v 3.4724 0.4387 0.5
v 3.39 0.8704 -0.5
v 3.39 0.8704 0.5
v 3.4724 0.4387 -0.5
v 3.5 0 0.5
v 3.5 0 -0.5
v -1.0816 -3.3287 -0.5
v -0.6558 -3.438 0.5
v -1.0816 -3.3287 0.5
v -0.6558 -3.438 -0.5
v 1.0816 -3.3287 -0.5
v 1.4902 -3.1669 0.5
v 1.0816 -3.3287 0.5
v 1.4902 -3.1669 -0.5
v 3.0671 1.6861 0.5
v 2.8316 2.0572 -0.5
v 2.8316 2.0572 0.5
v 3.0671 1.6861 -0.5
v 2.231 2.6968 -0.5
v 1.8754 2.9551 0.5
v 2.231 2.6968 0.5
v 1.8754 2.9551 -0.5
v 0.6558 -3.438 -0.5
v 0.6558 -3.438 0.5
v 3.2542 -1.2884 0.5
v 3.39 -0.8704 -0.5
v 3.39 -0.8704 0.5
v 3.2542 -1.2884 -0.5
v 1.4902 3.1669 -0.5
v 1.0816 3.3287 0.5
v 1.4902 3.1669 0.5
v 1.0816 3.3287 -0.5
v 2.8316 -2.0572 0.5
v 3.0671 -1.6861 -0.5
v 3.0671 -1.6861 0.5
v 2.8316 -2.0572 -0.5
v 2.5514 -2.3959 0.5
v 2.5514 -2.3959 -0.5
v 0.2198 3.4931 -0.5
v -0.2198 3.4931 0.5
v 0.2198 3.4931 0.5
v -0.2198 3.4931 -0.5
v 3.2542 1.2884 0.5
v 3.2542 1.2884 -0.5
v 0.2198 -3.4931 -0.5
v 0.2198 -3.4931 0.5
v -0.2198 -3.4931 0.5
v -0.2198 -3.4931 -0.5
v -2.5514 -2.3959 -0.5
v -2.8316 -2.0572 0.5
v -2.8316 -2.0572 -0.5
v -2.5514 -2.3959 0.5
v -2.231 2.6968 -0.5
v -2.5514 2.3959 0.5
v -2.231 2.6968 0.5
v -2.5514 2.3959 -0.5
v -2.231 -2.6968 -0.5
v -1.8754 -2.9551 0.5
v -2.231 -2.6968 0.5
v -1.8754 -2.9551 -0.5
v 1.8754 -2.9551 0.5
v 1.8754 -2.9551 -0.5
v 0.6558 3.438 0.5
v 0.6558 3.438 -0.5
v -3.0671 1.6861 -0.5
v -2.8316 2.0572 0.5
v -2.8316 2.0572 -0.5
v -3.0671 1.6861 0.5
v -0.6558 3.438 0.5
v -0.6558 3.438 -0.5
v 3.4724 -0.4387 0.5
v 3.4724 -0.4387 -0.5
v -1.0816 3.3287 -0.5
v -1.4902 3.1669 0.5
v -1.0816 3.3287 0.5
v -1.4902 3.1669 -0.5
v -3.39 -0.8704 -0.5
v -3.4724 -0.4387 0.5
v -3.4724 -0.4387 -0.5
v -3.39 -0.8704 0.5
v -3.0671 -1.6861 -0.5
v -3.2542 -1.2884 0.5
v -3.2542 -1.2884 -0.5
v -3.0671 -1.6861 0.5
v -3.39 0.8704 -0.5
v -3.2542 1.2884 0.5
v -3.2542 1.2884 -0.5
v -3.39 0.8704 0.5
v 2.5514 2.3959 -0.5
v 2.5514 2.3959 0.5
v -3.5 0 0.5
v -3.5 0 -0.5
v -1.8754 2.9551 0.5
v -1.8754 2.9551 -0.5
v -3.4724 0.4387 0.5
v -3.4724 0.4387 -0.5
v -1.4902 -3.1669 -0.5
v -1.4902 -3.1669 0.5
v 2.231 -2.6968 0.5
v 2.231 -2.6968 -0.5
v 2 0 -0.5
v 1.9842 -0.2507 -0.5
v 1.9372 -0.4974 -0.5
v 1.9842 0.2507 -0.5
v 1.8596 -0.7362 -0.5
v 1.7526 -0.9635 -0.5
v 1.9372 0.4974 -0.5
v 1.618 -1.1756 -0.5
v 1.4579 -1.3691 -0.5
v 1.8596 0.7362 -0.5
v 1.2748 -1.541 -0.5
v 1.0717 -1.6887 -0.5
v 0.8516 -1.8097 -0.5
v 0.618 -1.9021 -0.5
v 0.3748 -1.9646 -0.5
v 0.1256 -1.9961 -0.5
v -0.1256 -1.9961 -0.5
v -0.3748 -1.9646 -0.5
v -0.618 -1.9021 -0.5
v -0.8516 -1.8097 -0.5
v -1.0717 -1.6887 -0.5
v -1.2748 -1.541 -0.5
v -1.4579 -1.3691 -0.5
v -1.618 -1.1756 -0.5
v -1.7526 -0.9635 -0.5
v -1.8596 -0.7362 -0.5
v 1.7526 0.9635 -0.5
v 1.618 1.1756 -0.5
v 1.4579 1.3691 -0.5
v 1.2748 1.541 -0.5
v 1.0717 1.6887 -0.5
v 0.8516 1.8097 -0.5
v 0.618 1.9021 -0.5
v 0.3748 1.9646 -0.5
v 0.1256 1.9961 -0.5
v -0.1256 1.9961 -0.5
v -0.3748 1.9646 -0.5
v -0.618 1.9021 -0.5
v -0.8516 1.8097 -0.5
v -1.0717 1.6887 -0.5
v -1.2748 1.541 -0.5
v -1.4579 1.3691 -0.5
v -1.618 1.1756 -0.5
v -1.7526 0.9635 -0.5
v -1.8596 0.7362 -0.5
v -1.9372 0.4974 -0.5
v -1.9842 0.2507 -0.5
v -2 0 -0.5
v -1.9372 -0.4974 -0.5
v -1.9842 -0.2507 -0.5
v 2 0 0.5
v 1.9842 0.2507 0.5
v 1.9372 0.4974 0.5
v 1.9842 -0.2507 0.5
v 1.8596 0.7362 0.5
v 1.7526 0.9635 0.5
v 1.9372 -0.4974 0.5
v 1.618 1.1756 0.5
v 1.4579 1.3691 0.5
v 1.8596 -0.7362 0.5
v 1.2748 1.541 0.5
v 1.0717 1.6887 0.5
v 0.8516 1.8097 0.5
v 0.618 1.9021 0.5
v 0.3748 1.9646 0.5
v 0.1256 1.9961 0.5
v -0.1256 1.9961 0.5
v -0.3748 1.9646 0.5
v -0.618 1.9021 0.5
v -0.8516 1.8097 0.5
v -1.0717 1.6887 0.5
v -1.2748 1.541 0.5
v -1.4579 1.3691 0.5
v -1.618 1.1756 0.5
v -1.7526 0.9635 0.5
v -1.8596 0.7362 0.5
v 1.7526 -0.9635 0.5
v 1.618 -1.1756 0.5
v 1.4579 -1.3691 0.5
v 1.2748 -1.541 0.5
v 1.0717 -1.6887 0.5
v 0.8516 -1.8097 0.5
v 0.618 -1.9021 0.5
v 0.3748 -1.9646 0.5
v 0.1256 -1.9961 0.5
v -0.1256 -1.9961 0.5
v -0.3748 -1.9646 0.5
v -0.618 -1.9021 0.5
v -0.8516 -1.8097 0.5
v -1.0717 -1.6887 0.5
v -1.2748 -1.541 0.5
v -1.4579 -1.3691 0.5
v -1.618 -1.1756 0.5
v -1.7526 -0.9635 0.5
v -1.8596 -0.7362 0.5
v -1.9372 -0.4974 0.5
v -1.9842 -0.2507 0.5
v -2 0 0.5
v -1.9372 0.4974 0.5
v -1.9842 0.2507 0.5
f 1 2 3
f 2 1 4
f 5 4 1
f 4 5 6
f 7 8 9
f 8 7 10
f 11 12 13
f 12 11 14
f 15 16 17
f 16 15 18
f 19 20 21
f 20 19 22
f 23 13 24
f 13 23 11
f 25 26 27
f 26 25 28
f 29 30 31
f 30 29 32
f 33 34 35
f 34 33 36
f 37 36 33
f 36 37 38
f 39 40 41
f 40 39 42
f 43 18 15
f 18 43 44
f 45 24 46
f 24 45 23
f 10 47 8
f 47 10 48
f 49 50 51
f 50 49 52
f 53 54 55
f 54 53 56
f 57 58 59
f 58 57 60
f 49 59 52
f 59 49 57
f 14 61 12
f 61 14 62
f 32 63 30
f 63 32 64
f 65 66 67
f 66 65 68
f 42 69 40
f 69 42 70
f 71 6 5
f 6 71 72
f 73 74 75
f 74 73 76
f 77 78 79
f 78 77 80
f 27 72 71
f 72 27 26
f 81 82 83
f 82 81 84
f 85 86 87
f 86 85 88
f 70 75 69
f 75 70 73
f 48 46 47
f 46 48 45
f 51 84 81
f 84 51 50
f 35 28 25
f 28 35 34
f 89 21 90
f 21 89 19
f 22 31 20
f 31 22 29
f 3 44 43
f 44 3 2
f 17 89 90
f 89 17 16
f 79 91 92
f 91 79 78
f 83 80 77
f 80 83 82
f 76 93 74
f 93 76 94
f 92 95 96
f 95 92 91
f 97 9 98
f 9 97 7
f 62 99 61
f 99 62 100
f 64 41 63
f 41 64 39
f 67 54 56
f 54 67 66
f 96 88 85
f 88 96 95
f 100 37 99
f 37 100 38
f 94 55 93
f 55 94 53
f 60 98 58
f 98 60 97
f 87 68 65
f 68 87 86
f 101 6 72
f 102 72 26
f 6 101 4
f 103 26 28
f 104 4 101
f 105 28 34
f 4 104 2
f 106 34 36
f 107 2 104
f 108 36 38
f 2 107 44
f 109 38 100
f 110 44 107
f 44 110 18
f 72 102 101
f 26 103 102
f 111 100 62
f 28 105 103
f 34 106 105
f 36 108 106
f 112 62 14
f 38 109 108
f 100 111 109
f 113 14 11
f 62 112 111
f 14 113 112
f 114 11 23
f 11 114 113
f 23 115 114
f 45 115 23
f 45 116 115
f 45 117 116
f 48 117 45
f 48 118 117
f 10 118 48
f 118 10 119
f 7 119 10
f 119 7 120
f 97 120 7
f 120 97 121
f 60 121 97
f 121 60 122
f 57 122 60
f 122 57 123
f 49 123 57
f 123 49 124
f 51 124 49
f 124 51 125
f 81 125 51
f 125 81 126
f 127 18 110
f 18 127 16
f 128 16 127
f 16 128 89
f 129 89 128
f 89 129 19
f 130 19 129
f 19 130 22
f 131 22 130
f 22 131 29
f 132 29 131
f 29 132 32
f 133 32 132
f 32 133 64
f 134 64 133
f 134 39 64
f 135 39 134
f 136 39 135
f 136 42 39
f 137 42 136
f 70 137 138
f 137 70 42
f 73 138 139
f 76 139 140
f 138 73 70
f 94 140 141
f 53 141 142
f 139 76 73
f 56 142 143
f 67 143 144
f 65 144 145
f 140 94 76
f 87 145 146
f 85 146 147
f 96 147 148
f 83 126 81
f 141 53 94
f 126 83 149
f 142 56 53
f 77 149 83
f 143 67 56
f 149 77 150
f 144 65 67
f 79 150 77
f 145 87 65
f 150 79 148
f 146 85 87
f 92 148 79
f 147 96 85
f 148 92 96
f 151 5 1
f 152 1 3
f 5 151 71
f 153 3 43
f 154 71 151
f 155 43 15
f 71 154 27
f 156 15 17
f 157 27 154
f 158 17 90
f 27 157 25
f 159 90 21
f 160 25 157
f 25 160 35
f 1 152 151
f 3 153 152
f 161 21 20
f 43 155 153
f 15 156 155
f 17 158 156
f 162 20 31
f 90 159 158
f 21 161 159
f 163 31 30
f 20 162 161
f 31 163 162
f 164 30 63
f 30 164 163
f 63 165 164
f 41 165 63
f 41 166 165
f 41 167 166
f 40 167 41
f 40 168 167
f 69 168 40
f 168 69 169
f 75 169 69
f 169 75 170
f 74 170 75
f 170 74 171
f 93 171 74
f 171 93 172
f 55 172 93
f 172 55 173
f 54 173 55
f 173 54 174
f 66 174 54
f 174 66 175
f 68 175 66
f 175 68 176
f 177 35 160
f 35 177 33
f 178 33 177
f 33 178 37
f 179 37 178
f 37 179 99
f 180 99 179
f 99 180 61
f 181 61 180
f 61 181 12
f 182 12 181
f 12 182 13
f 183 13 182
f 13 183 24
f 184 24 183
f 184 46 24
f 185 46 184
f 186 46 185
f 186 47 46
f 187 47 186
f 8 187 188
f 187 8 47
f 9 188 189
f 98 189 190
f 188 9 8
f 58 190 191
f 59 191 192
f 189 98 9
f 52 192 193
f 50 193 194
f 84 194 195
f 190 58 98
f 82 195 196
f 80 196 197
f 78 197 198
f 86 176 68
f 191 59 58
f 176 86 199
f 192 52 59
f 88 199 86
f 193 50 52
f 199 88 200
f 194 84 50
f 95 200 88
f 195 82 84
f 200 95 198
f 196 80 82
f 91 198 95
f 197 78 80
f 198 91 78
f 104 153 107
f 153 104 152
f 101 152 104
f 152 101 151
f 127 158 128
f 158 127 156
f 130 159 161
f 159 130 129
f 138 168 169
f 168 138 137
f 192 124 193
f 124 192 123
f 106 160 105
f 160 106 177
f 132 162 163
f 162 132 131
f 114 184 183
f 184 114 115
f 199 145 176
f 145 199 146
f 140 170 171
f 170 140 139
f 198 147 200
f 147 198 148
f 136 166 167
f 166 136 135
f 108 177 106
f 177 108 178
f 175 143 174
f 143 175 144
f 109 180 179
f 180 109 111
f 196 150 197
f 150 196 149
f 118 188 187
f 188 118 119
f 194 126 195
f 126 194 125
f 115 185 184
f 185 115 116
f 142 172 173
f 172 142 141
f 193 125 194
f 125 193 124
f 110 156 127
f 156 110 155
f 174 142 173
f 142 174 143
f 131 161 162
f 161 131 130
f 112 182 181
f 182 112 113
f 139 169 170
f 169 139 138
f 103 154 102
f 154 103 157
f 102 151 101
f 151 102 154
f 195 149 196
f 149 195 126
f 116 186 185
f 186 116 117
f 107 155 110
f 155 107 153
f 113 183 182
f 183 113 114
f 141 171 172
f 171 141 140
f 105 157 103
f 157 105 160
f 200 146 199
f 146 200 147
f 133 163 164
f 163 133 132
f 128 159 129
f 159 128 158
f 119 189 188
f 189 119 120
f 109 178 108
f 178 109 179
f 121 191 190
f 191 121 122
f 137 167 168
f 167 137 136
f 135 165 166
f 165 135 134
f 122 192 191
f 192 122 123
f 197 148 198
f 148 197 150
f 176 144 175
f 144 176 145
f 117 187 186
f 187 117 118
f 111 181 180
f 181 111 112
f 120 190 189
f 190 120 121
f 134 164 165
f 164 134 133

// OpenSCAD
$fn = 50;


difference() {
	union() {
		translate(v = [0, 0, -0.5000000000]) {
			cylinder(h = 1, r = 3.5000000000);
		}
	}
	union() {
		translate(v = [0, 0, -100.0000000000]) {
			cylinder(h = 200, r = 2.0000000000);
		}
	}
}
